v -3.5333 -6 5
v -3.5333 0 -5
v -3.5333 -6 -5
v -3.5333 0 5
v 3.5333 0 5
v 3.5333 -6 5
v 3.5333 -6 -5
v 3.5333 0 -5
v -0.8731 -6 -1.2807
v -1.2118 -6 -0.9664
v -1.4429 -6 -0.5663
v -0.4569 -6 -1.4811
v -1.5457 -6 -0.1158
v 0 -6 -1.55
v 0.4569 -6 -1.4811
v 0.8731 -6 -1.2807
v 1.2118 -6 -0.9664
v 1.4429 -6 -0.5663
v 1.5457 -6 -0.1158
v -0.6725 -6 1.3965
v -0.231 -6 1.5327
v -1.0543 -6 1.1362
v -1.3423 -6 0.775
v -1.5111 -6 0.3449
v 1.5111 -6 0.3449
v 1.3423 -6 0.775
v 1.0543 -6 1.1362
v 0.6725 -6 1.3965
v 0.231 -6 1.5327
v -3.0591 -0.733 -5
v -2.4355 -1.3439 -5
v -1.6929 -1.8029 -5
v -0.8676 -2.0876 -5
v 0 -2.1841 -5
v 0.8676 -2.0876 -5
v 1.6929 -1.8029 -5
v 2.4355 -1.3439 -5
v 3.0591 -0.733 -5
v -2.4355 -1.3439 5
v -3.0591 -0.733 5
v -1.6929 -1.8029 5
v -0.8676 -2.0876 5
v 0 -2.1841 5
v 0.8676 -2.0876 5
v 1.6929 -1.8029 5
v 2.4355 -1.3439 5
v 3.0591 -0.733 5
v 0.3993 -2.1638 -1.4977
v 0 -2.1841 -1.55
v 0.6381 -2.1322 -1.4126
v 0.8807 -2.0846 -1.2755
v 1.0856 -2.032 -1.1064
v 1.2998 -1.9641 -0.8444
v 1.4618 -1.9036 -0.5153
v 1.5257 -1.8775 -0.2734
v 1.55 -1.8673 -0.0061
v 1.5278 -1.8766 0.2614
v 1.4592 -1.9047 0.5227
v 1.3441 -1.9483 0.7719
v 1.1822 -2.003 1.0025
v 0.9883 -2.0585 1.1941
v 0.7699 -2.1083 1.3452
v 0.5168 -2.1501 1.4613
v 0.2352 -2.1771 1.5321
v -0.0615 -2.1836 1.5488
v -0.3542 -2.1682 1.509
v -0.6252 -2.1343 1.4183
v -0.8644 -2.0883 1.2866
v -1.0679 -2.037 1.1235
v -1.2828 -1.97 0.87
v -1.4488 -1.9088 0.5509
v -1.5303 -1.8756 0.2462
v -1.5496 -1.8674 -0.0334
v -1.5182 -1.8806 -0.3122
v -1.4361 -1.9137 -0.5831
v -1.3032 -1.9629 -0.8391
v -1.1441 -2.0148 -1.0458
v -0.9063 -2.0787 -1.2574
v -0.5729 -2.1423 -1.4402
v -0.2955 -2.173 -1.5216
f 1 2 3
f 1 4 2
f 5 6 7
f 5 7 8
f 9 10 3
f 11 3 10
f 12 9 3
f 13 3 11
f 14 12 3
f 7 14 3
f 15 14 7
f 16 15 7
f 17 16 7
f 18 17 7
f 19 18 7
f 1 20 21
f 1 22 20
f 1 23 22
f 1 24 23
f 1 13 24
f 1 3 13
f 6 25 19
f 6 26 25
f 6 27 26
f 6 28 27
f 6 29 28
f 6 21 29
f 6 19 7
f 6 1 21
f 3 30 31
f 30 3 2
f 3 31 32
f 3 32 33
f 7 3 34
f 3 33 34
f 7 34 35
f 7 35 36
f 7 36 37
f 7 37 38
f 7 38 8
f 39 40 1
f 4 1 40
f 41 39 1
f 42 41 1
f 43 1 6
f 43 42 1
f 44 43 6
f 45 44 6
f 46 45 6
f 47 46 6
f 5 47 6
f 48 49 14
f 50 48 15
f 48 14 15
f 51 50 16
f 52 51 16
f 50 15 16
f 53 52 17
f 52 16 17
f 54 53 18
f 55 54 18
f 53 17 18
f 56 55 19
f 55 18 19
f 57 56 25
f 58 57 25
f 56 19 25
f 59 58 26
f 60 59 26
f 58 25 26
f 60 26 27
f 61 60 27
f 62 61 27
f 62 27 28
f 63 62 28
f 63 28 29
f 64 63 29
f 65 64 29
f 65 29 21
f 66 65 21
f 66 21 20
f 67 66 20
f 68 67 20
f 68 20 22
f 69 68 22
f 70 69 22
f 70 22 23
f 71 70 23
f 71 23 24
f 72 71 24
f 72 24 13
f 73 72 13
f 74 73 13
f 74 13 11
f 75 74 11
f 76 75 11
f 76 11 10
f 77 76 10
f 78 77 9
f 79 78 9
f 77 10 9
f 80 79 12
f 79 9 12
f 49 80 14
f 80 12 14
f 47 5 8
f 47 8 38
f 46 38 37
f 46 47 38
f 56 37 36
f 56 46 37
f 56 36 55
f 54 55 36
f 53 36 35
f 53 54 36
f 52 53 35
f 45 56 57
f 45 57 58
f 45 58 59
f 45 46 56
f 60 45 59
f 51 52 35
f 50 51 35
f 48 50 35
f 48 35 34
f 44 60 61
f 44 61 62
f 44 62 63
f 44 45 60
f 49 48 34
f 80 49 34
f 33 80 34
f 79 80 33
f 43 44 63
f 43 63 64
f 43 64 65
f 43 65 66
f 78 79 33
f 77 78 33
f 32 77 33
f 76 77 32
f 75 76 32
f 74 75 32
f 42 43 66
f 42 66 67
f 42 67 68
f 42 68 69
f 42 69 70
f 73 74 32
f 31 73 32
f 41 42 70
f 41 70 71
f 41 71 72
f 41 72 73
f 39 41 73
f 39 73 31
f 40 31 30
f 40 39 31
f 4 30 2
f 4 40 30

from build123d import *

# Parameters (mm, degrees)
BOSS_EXTRUDE1_DEPTH     = 5
CUT_EXTRUDE1_REACH      = 10.572
CUT_EXTRUDE1_END_RADIUS = 3.95
SKETCH2_R               = 1.55


with BuildPart() as part:
    # Sketch1 → Boss-Extrude1 (new, symmetric)
    with BuildSketch(Plane.XY):
        with BuildLine():
            Line((-3.533271058, -6), (3.533271058, -6))
            Line((3.533271058, -6), (3.533271058, 0))
            ThreePointArc((3.533271058, 0), (0, -2.184073719), (-3.533271058, 0))
            Line((-3.533271058, 0), (-3.533271058, -6))
        make_face()
    extrude(amount=BOSS_EXTRUDE1_DEPTH, both=True)

    # Cut-Extrude1: up to this cylinder (the profile starts outside it)
    cut_extrude1_end = Plane(origin=(0, 1.765926281, 0), z_dir=(0, 0, -1)) * Cylinder(CUT_EXTRUDE1_END_RADIUS, 30.044, mode=Mode.PRIVATE)
    # Sketch2 → Cut-Extrude1 (cut, up to the surface)
    with BuildSketch(Plane(origin=(0, -6, 0), x_dir=(-1, 0, 0), z_dir=(0, -1, 0)), mode=Mode.PRIVATE) as cut_extrude1_sk1:
        with Locations(Location((0, 0, 0), (0, 0, 90))):
            Circle(SKETCH2_R)
    cut_extrude1_tool1 = extrude(cut_extrude1_sk1.sketch, amount=-CUT_EXTRUDE1_REACH, mode=Mode.PRIVATE) - cut_extrude1_end
    add(cut_extrude1_tool1.solids().sort_by_distance((0, -6, 0))[0], mode=Mode.SUBTRACT)


solid = part.part
